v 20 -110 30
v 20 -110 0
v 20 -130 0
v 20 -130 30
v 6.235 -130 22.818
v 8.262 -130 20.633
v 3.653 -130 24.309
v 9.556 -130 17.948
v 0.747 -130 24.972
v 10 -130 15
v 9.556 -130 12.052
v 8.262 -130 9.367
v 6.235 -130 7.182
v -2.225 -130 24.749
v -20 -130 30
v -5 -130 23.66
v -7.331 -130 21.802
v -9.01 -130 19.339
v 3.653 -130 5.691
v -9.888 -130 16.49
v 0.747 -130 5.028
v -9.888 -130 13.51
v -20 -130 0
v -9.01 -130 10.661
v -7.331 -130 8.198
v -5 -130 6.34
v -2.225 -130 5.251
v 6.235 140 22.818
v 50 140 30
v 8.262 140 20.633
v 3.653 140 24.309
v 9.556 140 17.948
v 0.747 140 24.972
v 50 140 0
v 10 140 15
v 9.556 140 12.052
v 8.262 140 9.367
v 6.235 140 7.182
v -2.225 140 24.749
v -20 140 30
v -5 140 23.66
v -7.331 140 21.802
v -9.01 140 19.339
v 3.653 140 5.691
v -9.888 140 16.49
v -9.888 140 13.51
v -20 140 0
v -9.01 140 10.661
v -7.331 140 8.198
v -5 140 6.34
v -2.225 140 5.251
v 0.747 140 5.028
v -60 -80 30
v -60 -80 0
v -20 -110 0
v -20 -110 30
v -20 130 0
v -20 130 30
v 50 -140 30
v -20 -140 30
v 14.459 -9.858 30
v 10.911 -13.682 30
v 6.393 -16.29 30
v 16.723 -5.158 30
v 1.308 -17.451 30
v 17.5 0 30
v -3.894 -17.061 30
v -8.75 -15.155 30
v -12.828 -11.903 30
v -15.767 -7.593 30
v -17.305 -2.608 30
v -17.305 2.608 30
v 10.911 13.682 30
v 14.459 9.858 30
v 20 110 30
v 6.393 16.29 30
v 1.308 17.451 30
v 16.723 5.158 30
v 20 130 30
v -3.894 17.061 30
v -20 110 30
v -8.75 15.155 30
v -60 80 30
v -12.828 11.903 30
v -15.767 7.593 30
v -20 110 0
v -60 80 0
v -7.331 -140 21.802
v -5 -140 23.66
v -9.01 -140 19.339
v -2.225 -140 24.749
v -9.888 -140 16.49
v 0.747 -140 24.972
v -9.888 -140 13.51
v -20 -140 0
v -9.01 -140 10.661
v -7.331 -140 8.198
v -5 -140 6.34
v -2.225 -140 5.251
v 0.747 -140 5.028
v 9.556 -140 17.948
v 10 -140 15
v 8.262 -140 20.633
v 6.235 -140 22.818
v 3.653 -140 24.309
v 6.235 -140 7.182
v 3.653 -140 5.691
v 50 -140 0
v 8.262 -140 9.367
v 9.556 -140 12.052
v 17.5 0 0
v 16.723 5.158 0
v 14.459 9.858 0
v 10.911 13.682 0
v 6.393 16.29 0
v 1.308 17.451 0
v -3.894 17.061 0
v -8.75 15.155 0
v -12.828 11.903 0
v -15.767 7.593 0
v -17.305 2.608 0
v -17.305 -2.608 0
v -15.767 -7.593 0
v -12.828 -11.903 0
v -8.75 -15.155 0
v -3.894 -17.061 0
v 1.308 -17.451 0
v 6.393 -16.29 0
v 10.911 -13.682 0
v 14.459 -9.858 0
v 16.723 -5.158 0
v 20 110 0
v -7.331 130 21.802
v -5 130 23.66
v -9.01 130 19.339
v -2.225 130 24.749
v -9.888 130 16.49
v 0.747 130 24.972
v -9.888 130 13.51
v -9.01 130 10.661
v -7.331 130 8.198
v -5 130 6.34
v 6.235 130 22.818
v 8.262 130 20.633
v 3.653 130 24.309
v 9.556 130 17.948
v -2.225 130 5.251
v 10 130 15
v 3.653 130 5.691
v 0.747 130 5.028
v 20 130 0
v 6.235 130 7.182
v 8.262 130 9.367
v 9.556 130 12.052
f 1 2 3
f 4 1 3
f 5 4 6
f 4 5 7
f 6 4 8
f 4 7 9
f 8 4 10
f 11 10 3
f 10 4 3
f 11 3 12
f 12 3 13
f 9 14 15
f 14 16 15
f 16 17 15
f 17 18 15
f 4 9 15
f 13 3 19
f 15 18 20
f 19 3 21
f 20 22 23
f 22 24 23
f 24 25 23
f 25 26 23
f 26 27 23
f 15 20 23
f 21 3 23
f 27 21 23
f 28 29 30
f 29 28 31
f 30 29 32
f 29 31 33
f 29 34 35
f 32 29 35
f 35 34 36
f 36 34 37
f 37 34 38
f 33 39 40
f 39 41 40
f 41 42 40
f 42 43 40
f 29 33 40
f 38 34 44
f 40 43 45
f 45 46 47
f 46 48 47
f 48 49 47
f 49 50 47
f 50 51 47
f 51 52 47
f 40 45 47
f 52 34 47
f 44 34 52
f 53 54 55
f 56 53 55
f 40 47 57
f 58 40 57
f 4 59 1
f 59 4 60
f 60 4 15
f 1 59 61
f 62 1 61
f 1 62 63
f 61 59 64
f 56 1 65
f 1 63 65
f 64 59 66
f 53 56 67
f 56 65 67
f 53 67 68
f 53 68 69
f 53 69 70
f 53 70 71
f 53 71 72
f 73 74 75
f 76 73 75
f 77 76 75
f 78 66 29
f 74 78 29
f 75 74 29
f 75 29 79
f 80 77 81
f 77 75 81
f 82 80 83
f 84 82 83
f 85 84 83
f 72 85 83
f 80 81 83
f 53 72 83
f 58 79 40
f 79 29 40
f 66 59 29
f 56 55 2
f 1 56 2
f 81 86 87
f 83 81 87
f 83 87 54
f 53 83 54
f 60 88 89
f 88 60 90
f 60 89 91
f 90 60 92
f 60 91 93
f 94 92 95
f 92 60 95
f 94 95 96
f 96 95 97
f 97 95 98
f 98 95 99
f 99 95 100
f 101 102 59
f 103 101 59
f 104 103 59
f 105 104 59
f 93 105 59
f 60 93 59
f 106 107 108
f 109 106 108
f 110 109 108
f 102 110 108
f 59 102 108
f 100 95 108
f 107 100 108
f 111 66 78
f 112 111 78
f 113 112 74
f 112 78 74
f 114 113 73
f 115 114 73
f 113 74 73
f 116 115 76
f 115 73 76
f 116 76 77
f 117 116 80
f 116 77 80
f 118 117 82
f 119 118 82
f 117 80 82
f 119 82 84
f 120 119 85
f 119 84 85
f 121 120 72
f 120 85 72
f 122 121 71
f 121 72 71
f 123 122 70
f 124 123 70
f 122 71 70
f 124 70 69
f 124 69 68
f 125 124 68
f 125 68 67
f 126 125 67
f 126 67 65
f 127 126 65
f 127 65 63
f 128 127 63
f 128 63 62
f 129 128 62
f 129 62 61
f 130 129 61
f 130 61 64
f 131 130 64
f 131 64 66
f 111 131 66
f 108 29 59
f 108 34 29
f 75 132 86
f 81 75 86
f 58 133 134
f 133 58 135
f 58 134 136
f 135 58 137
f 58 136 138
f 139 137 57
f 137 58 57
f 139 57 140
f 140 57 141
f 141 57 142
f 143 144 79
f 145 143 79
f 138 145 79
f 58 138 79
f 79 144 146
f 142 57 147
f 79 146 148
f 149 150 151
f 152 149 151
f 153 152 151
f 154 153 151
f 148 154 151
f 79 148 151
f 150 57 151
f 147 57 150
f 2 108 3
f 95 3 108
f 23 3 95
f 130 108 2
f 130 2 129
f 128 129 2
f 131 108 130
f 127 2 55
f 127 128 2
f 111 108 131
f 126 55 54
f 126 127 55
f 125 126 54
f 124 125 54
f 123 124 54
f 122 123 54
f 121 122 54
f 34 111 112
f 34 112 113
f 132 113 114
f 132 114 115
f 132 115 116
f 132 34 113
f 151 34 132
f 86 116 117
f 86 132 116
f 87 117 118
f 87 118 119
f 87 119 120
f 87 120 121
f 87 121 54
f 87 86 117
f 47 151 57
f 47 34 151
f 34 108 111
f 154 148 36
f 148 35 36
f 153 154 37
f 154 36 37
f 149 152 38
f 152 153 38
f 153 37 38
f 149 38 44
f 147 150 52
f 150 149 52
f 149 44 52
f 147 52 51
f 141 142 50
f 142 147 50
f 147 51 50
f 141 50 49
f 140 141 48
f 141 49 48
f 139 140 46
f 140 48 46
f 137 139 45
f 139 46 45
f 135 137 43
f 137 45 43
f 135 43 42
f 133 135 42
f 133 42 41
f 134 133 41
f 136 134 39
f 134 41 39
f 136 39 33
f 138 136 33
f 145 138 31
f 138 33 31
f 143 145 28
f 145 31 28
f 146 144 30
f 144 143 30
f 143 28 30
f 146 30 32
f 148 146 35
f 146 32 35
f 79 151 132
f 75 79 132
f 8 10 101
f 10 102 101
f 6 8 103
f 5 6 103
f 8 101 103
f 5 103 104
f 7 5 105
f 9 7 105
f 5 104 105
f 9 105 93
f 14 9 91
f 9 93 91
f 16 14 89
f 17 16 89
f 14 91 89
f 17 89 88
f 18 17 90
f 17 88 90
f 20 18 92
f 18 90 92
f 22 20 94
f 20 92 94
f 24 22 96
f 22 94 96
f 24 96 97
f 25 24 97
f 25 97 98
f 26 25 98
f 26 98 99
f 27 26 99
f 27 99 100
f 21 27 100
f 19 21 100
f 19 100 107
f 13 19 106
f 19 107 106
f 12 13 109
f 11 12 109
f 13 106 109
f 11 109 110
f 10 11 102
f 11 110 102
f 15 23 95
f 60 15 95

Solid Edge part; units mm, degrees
sketch "Sketch1" plane through (0, 0, 0) normal (0, 0, 1) x (1, 0, 0)
  line L0 (50, 140) -> (50, -140)
  line L1 (-20, -140) -> (50, -140)
  line L2 (-20, -130) -> (-20, -140)
  line L3 (20, -130) -> (-20, -130)
  line L4 (20, -110) -> (20, -130)
  line L5 (-20, -110) -> (20, -110)
  line L6 (-60, -80) -> (-20, -110)
  line L7 (-60, 80) -> (-60, -80)
  line L8 (-20, 110) -> (-60, 80)
  line L9 (20, 110) -> (-20, 110)
  line L10 (20, 130) -> (20, 110)
  line L11 (-20, 130) -> (20, 130)
  line L12 (-20, 140) -> (-20, 130)
  line L13 (50, 140) -> (-20, 140)
  dimension "D1" = 280
  dimension "D2" = 10
  dimension "D3" = 10
  dimension "D4" = 20
  dimension "D5" = 20
  dimension "D6" = 30
  dimension "D7" = 30
  dimension "D8" = 110
  dimension "D9" = 70
  dimension "D10" = 70
  dimension "D11" = 160
extrude "Protrusion1" add sketch "Sketch1" along normal blind 30
sketch "Sketch2" plane through (15, -140, 15) normal (0, -1, 0) x (1, 0, 0)
  circle A0 centre (-15, 0) radius 10
  dimension "D1" = 20
extrude "Cutout1" cut sketch "Sketch2" against normal up to next
mirror "Mirror1" about plane through (0, 0, 0) normal (0, -1, 0) of "Cutout1"
sketch "Sketch3" plane through (-5, 0, 30) normal (0, 0, 1) x (1, 0, 0)
  circle A0 centre (5, 0) radius 17.5
  dimension "D1" = 35
extrude "Cutout2" cut sketch "Sketch3" against normal up to next
